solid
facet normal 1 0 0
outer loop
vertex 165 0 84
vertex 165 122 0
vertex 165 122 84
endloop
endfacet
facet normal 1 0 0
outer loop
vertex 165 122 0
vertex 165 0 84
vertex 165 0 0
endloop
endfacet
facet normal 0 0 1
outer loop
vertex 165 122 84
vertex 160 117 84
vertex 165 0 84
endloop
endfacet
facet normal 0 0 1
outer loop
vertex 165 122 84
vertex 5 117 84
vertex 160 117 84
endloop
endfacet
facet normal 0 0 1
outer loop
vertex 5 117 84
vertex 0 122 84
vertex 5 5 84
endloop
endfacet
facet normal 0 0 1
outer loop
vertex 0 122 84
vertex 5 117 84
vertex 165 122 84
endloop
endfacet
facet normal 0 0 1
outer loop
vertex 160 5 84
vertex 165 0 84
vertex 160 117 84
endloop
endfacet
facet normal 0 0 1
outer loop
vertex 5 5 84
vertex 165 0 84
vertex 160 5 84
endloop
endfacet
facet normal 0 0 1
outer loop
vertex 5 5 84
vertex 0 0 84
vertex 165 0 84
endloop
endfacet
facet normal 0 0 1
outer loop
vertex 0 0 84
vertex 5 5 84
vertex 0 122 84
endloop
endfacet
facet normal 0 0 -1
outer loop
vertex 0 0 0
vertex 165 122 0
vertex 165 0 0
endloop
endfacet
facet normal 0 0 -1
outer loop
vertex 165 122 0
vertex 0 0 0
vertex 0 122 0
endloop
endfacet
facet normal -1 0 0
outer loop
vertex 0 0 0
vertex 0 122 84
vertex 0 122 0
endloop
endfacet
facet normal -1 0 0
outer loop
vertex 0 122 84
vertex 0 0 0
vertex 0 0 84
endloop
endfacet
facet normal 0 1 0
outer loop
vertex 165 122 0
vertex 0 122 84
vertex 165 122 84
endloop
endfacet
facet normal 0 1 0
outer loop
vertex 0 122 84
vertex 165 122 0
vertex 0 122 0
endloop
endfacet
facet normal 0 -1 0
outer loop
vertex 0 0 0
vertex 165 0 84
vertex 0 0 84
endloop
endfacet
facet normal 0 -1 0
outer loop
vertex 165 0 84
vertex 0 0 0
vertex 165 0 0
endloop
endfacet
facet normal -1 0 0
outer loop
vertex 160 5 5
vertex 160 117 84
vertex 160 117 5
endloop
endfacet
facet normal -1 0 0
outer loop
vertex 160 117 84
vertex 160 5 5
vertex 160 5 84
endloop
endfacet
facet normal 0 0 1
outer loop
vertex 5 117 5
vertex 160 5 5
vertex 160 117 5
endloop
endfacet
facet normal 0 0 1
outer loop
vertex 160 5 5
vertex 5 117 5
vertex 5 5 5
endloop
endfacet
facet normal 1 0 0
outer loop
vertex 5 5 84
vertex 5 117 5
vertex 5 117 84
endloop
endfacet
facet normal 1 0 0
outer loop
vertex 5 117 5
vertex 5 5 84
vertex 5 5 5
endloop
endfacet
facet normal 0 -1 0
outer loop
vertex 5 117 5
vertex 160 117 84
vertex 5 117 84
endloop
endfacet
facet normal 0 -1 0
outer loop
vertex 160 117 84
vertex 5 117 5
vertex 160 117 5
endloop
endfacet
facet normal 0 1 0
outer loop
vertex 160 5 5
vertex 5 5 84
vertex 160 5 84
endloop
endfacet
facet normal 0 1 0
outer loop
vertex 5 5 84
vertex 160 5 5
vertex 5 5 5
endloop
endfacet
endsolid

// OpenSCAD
// Synthetic Forma demo geometry — NOT production CAD.
module cage() {
  difference() { cube([165,122,84]); translate([5,5,5]) cube([155,112,79]); }
}
cage();
